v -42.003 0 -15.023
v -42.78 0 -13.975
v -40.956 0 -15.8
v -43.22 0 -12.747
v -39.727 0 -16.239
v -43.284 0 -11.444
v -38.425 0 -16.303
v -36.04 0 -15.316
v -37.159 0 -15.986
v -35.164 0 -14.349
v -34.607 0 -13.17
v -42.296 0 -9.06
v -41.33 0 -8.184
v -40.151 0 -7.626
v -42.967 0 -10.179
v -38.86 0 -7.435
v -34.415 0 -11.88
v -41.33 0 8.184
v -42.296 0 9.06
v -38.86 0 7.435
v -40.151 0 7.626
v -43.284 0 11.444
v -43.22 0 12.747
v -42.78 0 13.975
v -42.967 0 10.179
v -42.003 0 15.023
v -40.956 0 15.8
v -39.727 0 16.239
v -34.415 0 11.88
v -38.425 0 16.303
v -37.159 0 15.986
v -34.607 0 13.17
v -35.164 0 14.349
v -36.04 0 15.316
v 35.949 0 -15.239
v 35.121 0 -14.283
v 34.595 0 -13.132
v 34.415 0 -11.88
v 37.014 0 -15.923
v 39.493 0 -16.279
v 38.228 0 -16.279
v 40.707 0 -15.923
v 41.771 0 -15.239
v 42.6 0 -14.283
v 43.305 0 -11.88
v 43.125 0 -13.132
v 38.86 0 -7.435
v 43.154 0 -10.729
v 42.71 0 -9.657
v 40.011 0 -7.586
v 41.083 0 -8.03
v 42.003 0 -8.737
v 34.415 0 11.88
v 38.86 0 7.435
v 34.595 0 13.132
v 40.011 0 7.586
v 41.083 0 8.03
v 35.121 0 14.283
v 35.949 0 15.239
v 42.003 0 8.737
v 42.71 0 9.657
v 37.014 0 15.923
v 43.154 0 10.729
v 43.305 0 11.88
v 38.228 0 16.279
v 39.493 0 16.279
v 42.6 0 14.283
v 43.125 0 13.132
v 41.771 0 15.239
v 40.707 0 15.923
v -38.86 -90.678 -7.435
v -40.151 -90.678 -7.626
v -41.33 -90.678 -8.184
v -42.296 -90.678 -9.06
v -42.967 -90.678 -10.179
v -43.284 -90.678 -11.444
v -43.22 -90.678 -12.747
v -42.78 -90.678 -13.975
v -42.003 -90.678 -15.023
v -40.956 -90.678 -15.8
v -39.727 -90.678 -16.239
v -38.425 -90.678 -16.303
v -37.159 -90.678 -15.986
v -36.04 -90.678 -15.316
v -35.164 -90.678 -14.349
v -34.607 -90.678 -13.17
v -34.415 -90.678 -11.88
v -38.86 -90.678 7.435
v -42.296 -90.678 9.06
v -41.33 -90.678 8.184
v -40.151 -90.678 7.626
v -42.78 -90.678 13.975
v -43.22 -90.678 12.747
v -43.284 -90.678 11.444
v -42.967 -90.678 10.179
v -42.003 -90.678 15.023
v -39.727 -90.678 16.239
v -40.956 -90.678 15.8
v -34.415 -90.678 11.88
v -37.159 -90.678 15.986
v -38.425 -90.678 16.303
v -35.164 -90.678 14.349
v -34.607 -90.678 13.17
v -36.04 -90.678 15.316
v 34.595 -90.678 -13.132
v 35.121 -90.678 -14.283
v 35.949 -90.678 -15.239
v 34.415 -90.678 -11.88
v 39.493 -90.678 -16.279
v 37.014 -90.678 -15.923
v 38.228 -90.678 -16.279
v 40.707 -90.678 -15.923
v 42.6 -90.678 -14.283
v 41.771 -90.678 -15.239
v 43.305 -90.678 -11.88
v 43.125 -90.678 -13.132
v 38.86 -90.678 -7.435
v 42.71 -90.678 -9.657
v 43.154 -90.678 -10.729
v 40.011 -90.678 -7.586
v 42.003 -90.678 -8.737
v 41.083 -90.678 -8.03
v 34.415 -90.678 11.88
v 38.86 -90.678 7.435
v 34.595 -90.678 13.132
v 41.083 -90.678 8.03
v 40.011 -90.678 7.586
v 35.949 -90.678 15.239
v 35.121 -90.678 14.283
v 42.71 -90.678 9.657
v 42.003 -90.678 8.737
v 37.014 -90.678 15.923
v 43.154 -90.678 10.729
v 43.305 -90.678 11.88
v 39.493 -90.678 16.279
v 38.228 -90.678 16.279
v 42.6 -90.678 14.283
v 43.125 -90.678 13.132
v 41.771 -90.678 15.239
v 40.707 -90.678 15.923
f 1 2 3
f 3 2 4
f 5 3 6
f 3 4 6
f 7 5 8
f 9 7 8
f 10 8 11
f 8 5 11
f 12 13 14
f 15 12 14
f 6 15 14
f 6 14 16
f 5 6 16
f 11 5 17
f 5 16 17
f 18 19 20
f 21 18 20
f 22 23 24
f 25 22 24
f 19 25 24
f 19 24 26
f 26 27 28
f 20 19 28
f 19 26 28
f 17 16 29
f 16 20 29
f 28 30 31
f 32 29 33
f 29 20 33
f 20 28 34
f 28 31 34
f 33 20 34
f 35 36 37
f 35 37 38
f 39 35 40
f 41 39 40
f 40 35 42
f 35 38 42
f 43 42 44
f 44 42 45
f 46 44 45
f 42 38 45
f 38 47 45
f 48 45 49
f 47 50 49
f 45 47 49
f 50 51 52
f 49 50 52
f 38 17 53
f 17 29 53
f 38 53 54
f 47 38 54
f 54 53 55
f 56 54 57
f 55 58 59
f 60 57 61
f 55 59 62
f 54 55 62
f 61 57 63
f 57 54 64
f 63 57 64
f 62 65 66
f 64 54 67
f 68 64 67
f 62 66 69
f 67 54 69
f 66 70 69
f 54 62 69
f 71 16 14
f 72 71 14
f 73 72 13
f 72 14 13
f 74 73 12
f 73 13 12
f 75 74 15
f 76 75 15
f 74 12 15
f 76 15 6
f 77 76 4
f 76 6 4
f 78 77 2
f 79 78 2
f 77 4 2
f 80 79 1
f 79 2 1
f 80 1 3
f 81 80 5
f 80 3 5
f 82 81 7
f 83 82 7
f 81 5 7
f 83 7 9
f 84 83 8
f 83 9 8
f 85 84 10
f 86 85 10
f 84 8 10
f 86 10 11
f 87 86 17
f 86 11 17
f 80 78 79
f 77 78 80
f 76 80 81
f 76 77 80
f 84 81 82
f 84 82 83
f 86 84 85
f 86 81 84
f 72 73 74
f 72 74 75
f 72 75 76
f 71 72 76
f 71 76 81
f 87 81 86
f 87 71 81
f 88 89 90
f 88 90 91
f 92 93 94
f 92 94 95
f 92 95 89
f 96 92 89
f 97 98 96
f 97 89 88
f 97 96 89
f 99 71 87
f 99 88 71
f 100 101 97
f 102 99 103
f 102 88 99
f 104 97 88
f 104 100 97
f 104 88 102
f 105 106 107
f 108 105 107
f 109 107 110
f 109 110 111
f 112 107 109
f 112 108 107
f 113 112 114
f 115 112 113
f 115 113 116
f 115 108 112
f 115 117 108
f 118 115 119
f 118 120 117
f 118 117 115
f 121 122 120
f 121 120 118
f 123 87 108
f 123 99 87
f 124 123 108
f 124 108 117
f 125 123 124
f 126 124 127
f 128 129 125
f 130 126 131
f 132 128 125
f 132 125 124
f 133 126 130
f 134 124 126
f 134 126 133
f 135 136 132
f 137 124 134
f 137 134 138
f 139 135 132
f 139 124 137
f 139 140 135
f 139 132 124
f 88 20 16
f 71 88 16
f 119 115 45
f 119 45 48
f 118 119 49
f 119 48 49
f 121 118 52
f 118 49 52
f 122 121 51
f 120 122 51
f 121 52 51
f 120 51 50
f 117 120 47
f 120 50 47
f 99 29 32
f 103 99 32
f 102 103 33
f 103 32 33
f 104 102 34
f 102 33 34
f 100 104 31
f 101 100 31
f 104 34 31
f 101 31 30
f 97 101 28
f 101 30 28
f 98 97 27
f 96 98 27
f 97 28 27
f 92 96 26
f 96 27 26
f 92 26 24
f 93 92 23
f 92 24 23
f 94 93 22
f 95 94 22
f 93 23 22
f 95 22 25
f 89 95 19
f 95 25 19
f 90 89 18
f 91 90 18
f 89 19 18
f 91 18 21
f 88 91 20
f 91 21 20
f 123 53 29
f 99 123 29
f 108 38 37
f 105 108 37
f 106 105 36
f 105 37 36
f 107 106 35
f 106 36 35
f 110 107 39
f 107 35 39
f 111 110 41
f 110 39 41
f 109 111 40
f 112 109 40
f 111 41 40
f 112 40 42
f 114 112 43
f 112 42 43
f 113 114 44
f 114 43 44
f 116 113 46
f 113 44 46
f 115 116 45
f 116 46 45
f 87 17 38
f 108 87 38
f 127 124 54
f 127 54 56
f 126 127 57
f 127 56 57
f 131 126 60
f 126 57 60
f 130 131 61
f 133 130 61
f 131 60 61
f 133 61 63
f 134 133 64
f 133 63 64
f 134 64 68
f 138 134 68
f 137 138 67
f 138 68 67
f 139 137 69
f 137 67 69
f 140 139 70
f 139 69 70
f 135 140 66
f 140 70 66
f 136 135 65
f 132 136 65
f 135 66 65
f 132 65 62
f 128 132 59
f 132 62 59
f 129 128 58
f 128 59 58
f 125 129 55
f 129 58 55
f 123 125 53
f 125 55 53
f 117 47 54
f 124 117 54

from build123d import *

# Parameters (mm, degrees)
F1_DEPTH = 90.678


with BuildPart() as f1:
    # F0 (on Front) → F1 (new body)
    with BuildSketch(Plane.XZ):
        with BuildLine():
            Line((-38.8602614403, 7.4346788156), (-38.8602614403, 11.8796788156))
            Line((-38.8602614403, 11.8796788156), (-34.4152614403, 11.8796788156))
            ThreePointArc((-34.4152614403, 11.8796788156), (-42.0033510827, 15.022768458), (-38.8602614403, 7.4346788156))
        make_face()
        with BuildLine():
            Line((-34.4152614403, 11.8796788156), (-38.8602614403, 11.8796788156))
            Line((-38.8602614403, 11.8796788156), (-38.8602614403, 7.4346788156))
            ThreePointArc((-38.8602614403, 7.4346788156), (-35.7171717979, 8.7365891732), (-34.4152614403, 11.8796788156))
        make_face()
        with BuildLine():
            Line((34.4152614403, 11.8796788156), (-34.4152614403, 11.8796788156))
            ThreePointArc((-34.4152614403, 11.8796788156), (-35.7171717979, 8.7365891732), (-38.8602614403, 7.4346788156))
            Line((-38.8602614403, 7.4346788156), (-38.8602614403, -7.4346788156))
            ThreePointArc((-38.8602614403, -7.4346788156), (-35.7171717979, -8.7365891732), (-34.4152614403, -11.8796788156))
            Line((-34.4152614403, -11.8796788156), (34.4152614403, -11.8796788156))
            ThreePointArc((34.4152614403, -11.8796788156), (35.7171717979, -8.7365891732), (38.8602614403, -7.4346788156))
            Line((38.8602614403, -7.4346788156), (38.8602614403, 7.4346788156))
            ThreePointArc((38.8602614403, 7.4346788156), (35.7171717979, 8.7365891732), (34.4152614403, 11.8796788156))
        make_face()
        with BuildLine():
            ThreePointArc((43.3052614403, 11.8796788156), (38.8602614403, 16.3246788156), (34.4152614403, 11.8796788156))
            Line((34.4152614403, 11.8796788156), (38.8602614403, 11.8796788156))
            Line((38.8602614403, 11.8796788156), (38.8602614403, 7.4346788156))
            ThreePointArc((38.8602614403, 7.4346788156), (42.0033510827, 8.7365891732), (43.3052614403, 11.8796788156))
        make_face()
        with BuildLine():
            Line((38.8602614403, 11.8796788156), (34.4152614403, 11.8796788156))
            ThreePointArc((34.4152614403, 11.8796788156), (35.7171717979, 8.7365891732), (38.8602614403, 7.4346788156))
            Line((38.8602614403, 7.4346788156), (38.8602614403, 11.8796788156))
        make_face()
        with BuildLine():
            ThreePointArc((-34.4152614403, -11.8796788156), (-35.7171717979, -8.7365891732), (-38.8602614403, -7.4346788156))
            Line((-38.8602614403, -7.4346788156), (-38.8602614403, -11.8796788156))
            Line((-38.8602614403, -11.8796788156), (-34.4152614403, -11.8796788156))
        make_face()
        with BuildLine():
            Line((-38.8602614403, -11.8796788156), (-38.8602614403, -7.4346788156))
            ThreePointArc((-38.8602614403, -7.4346788156), (-42.0033510827, -15.022768458), (-34.4152614403, -11.8796788156))
            Line((-34.4152614403, -11.8796788156), (-38.8602614403, -11.8796788156))
        make_face()
        with BuildLine():
            ThreePointArc((43.3052614403, -11.8796788156), (42.0033510827, -8.7365891732), (38.8602614403, -7.4346788156))
            Line((38.8602614403, -7.4346788156), (38.8602614403, -11.8796788156))
            Line((38.8602614403, -11.8796788156), (34.4152614403, -11.8796788156))
            ThreePointArc((34.4152614403, -11.8796788156), (38.8602614403, -16.3246788156), (43.3052614403, -11.8796788156))
        make_face()
        with BuildLine():
            Line((38.8602614403, -11.8796788156), (38.8602614403, -7.4346788156))
            ThreePointArc((38.8602614403, -7.4346788156), (35.7171717979, -8.7365891732), (34.4152614403, -11.8796788156))
            Line((34.4152614403, -11.8796788156), (38.8602614403, -11.8796788156))
        make_face()
    extrude(amount=F1_DEPTH)


solid = f1.part
